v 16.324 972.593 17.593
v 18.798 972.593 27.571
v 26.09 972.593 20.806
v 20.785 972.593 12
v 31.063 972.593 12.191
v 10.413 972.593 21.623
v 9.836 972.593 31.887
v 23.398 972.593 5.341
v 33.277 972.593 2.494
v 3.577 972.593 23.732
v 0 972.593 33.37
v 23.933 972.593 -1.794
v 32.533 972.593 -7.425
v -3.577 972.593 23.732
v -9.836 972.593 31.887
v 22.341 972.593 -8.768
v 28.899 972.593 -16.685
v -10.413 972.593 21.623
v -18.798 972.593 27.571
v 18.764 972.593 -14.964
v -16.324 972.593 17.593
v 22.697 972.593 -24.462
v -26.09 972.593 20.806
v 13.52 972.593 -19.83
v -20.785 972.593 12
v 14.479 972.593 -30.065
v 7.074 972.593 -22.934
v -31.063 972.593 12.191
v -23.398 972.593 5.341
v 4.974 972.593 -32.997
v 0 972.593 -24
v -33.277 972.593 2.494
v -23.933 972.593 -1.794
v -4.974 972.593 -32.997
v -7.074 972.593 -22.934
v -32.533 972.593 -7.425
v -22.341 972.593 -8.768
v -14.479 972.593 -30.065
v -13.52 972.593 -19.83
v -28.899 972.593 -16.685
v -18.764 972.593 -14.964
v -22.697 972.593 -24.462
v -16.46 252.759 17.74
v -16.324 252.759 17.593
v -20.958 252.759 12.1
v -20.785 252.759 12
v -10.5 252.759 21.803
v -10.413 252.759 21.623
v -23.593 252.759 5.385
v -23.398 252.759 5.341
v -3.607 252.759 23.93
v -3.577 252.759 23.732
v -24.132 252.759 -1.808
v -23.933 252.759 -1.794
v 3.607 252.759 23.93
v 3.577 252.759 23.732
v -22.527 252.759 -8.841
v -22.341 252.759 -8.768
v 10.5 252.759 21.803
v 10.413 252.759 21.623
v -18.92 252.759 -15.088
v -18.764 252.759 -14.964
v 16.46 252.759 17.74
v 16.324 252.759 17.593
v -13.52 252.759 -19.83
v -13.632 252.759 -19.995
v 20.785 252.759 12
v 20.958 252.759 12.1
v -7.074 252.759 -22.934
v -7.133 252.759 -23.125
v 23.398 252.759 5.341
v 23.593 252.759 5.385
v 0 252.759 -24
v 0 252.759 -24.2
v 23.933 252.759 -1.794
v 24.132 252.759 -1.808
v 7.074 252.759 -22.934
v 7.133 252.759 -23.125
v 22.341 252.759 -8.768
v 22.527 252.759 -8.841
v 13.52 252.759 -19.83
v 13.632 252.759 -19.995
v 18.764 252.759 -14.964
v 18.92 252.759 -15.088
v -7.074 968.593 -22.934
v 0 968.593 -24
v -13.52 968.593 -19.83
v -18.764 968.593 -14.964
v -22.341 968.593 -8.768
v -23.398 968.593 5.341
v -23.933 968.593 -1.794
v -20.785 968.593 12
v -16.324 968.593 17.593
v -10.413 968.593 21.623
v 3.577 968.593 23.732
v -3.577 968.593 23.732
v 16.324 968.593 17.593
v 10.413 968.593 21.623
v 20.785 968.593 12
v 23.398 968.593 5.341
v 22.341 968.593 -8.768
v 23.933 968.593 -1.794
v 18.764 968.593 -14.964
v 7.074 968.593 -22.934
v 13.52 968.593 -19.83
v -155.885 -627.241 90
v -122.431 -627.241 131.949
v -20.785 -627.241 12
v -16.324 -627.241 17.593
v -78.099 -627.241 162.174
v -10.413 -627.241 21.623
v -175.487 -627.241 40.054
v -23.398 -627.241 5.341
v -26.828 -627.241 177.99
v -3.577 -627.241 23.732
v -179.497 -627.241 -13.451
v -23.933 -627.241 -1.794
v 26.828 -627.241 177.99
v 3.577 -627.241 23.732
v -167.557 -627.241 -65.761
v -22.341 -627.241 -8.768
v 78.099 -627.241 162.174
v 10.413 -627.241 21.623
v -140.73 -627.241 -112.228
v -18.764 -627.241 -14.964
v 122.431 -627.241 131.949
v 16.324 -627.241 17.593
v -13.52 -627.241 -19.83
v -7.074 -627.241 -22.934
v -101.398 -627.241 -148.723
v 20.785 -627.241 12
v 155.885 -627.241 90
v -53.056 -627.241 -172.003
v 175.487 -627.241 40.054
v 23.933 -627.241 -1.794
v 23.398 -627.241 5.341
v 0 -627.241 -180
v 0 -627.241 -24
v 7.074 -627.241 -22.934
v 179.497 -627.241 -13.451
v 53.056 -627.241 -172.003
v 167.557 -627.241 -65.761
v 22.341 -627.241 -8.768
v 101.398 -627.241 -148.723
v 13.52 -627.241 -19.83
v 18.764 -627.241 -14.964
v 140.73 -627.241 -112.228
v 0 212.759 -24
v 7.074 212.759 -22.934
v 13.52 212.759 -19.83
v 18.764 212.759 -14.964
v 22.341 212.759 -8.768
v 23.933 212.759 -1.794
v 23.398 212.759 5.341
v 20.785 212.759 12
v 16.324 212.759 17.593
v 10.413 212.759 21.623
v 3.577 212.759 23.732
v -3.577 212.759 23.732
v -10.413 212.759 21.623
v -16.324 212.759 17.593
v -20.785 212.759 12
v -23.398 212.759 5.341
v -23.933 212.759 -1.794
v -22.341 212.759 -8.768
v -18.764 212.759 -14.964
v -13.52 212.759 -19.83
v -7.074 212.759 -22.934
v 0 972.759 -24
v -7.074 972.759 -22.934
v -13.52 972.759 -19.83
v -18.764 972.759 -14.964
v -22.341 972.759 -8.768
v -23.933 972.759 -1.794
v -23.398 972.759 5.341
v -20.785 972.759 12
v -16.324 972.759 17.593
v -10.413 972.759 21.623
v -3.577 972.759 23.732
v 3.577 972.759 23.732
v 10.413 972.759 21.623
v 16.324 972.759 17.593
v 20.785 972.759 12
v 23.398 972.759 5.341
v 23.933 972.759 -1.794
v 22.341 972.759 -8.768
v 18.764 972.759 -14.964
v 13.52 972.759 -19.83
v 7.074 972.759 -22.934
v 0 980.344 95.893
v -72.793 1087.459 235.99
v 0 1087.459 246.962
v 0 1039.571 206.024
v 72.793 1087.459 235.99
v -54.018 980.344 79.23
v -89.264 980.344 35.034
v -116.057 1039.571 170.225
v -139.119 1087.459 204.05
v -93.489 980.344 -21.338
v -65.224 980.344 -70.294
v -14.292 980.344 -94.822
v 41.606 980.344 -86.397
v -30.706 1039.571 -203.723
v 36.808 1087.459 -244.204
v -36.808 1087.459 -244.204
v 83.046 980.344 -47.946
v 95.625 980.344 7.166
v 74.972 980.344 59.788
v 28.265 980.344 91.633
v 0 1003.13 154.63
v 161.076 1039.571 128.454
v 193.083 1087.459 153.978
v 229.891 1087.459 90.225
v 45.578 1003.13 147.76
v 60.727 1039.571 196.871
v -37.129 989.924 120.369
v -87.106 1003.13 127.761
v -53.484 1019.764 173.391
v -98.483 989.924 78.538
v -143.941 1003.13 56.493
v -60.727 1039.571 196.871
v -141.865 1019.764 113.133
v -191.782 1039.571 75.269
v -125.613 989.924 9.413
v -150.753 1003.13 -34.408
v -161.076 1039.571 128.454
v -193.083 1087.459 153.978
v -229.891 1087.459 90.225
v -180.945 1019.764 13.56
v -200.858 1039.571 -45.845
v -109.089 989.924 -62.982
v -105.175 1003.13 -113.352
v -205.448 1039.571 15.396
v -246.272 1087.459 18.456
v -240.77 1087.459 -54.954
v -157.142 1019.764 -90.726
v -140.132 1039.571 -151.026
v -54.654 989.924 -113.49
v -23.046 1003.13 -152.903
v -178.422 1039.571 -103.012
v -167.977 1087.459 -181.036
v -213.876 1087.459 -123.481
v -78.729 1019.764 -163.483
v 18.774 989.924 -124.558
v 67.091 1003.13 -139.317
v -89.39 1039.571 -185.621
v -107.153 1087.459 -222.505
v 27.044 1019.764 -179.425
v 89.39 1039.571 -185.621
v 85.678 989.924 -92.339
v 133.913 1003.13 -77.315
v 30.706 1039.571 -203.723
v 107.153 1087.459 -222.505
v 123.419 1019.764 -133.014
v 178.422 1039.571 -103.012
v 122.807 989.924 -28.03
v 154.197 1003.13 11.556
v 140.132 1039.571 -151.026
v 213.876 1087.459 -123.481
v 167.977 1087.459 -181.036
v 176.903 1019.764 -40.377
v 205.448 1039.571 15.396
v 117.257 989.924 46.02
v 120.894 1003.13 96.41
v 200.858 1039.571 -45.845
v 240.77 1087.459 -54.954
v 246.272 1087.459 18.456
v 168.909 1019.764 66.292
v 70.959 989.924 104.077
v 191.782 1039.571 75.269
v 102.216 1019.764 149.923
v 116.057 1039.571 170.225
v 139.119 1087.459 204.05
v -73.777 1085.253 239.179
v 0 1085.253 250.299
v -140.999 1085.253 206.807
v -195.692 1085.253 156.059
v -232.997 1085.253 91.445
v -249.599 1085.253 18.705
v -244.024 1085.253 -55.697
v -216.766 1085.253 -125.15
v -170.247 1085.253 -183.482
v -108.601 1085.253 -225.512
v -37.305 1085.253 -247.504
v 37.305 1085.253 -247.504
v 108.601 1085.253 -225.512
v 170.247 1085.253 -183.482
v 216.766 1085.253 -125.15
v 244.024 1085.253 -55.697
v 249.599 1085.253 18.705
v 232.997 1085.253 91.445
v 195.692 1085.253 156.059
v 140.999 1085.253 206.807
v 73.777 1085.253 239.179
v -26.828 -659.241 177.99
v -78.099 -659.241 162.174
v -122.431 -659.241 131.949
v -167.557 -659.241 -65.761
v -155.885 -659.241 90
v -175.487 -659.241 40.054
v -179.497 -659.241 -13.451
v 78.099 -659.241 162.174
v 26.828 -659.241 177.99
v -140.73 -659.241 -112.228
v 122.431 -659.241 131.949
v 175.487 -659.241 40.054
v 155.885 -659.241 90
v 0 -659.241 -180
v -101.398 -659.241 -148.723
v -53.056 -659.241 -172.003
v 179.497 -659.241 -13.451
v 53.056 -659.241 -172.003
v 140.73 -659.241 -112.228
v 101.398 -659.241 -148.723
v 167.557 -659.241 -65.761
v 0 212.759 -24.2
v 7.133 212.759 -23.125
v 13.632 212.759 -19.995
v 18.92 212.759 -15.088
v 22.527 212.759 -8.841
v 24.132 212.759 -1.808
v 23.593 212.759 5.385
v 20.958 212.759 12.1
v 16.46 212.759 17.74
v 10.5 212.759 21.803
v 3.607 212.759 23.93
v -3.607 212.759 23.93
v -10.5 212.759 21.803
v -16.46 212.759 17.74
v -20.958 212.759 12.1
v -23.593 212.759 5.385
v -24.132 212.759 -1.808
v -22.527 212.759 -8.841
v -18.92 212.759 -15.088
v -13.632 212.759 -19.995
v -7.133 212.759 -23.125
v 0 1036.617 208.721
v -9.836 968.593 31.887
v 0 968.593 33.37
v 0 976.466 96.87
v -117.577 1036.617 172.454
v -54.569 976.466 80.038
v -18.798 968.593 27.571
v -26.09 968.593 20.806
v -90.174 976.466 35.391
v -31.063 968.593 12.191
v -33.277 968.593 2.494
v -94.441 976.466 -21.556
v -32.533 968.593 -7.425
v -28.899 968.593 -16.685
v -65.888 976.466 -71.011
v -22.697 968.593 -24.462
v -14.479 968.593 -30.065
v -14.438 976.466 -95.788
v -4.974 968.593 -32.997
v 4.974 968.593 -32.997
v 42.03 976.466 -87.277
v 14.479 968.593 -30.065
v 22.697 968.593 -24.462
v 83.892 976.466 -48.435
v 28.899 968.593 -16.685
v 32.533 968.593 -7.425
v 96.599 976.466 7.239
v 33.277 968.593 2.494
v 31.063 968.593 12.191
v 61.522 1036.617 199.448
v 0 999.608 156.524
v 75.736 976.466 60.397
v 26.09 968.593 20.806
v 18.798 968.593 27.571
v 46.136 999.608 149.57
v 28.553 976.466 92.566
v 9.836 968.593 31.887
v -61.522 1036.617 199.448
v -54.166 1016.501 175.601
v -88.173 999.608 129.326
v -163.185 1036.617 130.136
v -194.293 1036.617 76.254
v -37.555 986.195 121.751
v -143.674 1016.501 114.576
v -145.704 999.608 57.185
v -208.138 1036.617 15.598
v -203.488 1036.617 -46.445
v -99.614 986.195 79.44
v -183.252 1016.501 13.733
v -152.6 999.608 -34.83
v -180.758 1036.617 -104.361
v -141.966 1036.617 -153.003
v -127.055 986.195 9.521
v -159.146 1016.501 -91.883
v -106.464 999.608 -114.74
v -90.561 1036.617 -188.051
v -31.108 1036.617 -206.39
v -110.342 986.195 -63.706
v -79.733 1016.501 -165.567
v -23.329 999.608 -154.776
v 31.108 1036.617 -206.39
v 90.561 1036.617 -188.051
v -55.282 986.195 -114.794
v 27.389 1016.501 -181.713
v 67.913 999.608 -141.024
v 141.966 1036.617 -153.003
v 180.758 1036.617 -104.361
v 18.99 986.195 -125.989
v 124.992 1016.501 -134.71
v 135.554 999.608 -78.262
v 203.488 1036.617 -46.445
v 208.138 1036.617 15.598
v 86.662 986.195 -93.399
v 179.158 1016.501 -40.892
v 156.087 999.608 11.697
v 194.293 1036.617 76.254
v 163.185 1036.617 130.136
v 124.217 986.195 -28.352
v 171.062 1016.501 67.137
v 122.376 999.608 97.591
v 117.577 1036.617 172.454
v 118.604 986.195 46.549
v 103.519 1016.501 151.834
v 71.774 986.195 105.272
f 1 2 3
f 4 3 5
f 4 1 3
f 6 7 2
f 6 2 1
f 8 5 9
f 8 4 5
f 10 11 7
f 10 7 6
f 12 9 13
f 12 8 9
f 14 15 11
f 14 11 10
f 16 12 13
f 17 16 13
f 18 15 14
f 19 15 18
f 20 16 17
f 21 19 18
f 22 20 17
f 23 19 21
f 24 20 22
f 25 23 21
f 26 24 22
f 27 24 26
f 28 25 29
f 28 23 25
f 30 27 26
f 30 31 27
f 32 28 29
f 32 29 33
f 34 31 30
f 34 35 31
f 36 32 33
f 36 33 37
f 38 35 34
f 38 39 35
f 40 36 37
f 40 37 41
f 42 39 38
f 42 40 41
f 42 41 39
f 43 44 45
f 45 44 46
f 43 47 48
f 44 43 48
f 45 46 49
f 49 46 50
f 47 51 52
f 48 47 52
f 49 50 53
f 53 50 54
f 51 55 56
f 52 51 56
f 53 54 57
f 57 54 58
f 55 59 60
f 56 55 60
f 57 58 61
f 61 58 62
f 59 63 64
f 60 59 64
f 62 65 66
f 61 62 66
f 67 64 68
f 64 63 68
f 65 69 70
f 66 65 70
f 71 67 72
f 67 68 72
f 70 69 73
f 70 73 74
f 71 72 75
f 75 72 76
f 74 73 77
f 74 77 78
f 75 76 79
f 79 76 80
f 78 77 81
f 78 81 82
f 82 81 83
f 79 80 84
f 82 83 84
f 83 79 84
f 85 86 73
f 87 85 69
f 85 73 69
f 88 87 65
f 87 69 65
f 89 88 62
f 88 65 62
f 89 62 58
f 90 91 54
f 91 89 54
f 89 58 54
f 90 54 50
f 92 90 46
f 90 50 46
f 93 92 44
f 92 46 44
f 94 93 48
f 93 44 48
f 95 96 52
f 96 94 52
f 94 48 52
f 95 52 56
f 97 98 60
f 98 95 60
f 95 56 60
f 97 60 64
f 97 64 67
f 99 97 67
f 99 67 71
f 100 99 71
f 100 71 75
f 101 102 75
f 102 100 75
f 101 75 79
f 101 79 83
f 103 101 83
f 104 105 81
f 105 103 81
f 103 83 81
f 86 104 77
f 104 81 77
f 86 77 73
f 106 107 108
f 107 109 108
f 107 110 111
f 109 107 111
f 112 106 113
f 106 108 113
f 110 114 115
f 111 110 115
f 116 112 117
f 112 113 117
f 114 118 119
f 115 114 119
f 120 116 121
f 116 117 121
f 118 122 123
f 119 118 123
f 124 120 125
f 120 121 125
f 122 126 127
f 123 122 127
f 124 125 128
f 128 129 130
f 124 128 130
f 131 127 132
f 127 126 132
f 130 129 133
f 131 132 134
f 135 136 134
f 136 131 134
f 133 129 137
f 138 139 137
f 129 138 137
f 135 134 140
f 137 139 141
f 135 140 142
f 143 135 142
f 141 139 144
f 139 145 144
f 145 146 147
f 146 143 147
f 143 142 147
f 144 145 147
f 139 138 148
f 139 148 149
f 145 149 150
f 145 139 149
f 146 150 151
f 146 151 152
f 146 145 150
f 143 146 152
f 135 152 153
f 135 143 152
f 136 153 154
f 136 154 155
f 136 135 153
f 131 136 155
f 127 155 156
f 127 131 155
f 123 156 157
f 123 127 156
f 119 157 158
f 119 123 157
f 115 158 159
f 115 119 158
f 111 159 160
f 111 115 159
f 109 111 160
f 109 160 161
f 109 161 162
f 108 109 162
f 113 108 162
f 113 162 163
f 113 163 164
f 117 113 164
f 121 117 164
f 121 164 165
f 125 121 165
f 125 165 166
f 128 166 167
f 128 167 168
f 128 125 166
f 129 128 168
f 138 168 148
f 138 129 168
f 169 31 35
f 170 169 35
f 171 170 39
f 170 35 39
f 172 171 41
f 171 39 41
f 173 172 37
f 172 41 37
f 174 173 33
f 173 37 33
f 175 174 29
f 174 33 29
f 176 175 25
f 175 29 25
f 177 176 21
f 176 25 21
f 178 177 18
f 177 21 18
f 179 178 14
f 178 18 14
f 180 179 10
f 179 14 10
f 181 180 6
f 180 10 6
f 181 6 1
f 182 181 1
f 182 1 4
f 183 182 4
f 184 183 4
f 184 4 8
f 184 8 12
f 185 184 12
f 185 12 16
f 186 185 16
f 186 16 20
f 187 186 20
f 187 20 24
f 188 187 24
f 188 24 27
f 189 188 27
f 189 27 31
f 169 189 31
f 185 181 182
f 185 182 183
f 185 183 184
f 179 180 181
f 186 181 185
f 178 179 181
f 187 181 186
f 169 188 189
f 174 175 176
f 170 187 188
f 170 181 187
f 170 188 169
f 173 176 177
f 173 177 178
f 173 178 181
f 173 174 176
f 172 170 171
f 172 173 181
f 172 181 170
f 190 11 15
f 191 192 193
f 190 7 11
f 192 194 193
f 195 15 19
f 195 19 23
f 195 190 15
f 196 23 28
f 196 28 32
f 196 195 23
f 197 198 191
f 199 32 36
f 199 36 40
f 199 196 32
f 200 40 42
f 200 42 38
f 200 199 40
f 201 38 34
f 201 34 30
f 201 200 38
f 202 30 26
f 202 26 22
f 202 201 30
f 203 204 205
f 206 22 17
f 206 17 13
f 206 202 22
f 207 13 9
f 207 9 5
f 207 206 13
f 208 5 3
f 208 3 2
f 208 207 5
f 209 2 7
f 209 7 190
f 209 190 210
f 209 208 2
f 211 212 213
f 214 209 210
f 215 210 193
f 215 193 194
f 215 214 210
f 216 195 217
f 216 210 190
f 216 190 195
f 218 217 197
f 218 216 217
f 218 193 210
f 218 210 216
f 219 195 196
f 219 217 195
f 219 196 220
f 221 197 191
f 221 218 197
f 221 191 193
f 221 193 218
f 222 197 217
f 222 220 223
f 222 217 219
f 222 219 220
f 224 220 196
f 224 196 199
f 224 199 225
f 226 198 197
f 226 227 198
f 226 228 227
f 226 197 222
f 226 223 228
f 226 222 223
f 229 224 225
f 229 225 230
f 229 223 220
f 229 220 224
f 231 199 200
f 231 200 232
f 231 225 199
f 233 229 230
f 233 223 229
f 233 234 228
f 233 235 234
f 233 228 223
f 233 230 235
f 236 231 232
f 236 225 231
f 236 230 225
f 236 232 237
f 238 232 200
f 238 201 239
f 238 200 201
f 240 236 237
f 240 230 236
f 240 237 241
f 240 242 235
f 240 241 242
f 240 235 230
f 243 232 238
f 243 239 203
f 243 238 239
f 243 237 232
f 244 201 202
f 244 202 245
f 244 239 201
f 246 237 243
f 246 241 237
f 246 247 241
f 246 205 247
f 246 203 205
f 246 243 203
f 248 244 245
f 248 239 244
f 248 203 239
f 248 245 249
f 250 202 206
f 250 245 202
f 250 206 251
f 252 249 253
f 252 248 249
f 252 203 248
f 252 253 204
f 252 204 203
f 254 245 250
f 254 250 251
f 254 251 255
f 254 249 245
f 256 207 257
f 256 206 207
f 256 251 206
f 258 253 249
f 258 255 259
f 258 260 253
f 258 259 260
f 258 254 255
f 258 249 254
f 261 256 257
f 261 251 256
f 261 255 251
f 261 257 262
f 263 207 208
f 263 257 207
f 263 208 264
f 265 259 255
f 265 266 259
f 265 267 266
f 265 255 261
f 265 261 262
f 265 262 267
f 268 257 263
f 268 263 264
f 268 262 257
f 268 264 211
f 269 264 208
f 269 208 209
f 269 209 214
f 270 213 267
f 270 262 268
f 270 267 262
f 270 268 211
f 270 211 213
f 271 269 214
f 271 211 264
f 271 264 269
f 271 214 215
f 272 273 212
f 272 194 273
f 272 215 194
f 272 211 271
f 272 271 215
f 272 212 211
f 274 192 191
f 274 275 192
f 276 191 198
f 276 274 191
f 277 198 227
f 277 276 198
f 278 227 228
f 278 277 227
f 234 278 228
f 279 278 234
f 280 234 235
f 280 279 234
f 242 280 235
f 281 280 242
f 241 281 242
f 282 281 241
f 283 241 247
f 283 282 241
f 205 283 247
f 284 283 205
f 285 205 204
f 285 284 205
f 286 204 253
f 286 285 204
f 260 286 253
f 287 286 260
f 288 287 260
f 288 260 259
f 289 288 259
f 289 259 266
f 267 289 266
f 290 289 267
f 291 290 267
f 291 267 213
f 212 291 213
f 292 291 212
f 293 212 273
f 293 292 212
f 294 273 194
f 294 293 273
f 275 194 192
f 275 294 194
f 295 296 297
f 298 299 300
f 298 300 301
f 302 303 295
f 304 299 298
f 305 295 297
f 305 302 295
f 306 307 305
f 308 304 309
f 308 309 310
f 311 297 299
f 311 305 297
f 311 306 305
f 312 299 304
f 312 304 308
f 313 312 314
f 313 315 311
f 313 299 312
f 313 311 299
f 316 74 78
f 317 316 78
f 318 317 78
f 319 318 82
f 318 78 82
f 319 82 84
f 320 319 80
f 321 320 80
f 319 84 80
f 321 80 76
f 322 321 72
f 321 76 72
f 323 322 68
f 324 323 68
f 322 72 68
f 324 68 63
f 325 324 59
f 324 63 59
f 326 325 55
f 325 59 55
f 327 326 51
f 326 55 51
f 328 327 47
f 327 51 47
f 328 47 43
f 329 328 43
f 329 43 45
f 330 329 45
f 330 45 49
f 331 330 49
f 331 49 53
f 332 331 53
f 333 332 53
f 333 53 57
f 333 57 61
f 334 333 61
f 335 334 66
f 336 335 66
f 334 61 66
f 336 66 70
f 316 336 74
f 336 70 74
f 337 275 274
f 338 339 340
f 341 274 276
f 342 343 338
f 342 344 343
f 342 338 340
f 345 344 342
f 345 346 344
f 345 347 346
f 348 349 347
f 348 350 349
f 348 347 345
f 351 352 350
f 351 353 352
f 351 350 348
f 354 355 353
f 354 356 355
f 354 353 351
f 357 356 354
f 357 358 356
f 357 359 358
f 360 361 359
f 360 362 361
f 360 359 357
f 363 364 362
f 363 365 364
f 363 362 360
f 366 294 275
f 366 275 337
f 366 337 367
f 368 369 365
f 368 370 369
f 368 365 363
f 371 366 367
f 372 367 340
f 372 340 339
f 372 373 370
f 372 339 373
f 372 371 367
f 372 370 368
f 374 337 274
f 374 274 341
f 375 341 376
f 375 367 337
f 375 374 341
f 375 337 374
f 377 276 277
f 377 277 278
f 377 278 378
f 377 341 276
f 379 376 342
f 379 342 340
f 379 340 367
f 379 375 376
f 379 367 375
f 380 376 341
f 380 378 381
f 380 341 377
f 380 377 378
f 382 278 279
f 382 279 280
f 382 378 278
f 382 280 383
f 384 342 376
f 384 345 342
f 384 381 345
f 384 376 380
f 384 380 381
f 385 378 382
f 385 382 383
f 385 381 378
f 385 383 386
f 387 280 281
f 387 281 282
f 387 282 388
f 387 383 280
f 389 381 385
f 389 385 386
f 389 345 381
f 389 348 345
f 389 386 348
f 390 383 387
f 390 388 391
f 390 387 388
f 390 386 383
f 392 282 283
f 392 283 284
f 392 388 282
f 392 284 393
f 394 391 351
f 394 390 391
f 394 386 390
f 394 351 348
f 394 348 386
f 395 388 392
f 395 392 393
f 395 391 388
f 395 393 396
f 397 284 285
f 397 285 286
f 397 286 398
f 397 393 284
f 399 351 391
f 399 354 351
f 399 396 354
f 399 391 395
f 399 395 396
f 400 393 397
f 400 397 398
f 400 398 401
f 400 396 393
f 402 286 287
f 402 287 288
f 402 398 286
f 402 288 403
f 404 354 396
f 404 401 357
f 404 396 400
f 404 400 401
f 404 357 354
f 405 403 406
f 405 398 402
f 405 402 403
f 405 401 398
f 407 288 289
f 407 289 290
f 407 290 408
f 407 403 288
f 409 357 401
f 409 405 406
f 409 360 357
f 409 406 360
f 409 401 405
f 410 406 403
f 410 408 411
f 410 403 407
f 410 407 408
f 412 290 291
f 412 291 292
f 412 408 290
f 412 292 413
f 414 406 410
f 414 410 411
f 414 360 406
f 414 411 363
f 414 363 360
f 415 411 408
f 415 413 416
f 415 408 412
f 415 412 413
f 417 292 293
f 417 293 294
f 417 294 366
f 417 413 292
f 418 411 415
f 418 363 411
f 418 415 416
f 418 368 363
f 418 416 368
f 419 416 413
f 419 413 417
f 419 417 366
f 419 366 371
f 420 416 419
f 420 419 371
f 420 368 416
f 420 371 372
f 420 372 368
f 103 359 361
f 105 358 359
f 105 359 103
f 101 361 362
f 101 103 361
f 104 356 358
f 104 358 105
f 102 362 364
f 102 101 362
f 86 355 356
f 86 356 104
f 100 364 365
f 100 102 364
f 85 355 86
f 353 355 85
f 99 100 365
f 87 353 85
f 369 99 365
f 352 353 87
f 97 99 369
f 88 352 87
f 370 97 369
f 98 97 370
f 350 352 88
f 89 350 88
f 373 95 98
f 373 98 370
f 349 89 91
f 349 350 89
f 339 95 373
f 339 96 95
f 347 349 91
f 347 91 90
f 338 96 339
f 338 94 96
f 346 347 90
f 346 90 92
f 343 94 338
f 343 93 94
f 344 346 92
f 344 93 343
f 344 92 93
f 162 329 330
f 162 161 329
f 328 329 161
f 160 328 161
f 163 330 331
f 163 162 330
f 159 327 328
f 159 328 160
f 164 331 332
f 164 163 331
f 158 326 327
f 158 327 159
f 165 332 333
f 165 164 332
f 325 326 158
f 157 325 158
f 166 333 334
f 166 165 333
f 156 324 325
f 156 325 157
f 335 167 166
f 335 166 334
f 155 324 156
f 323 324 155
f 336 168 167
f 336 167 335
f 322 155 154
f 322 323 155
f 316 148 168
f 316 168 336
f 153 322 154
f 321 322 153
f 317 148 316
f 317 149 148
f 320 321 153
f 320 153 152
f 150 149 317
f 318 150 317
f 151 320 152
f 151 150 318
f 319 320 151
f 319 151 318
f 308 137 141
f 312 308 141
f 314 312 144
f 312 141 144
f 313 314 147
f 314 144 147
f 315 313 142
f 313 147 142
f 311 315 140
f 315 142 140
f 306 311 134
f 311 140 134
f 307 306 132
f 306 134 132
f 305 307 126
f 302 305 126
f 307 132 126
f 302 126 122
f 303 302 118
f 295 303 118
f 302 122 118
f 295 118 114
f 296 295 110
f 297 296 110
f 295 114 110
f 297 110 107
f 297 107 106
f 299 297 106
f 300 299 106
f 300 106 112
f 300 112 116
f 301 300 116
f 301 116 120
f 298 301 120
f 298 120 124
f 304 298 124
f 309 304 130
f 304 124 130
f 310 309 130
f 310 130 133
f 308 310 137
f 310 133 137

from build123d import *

# Parameters (mm, degrees)
SKETCH1_R           = 6
BASE_EXTRUDE_DEPTH  = 180
SKETCH2_R           = 6.05
BOSS_EXTRUDE1_DEPTH = 10
BOSS_EXTRUDE2_START = 210
SKETCH3_R           = 6
BOSS_EXTRUDE2_DEPTH = 210
SKETCH4_R           = 45
BOSS_EXTRUDE3_DEPTH = 8
SCALE1_SCALE        = 4


with BuildPart() as part:
    # Sketch1 → Base-Extrude (new body)
    with BuildSketch(Plane(origin=(0, 0, 0), x_dir=(1, 0, 0), z_dir=(0, 1, 0))):
        with Locations(Location((0, 0, 0), (0, 0, 90))):
            Circle(SKETCH1_R)
    extrude(amount=BASE_EXTRUDE_DEPTH)

    # Sketch2 → Boss-Extrude1 (add)
    with BuildSketch(Plane.XZ):
        with Locations(Location((0, 0, 0), (0, 0, 270))):
            Circle(SKETCH2_R)
    extrude(amount=BOSS_EXTRUDE1_DEPTH)

    # Sketch3 → Boss-Extrude2 (add)
    with BuildSketch(Plane.XZ.offset(10).offset(BOSS_EXTRUDE2_START)):
        with Locations(Location((0, 0, 0), (0, 0, 270))):
            Circle(SKETCH3_R)
    extrude(amount=-BOSS_EXTRUDE2_DEPTH)

    # Sketch4 → Boss-Extrude3 (add)
    with BuildSketch(Plane.XZ.offset(220)):
        with Locations(Location((0, 0, 0), (0, 0, 270))):
            Circle(SKETCH4_R)
    extrude(amount=BOSS_EXTRUDE3_DEPTH)

    # Sketch5 → Boss-Revolve-Thin1 (revolve)
    with BuildSketch(Plane.XY, mode=Mode.PRIVATE) as boss_revolve_thin1_sk:
        with BuildLine():
            Line((0, 179.958378868), (8.34246908, 179.958378868))
            ThreePointArc((8.34246908, 179.958378868), (38.657452483, 187.592823497), (61.740544461, 208.674897119))
            Line((61.740544461, 208.674897119), (62.574826169, 208.123558718))
            ThreePointArc((62.574826169, 208.123558718), (39.131088208, 186.712102655), (8.34246908, 178.958378868))
            Line((8.34246908, 178.958378868), (0, 178.958378868))
            Line((0, 178.958378868), (0, 179.958378868))
        make_face()
    revolve(boss_revolve_thin1_sk.sketch.rotate(Axis((0, 208.674897119, 0), (0, -1, 0)), 90), axis=Axis((0, 208.674897119, 0), (0, -1, 0)))


with BuildPart() as part_1:
    # Scale1: scaled about (0, -84.253032849, 0)
    add(part.part.scale(SCALE1_SCALE).moved(Location((0, 252.759098547, 0))))


solid = part_1.part
